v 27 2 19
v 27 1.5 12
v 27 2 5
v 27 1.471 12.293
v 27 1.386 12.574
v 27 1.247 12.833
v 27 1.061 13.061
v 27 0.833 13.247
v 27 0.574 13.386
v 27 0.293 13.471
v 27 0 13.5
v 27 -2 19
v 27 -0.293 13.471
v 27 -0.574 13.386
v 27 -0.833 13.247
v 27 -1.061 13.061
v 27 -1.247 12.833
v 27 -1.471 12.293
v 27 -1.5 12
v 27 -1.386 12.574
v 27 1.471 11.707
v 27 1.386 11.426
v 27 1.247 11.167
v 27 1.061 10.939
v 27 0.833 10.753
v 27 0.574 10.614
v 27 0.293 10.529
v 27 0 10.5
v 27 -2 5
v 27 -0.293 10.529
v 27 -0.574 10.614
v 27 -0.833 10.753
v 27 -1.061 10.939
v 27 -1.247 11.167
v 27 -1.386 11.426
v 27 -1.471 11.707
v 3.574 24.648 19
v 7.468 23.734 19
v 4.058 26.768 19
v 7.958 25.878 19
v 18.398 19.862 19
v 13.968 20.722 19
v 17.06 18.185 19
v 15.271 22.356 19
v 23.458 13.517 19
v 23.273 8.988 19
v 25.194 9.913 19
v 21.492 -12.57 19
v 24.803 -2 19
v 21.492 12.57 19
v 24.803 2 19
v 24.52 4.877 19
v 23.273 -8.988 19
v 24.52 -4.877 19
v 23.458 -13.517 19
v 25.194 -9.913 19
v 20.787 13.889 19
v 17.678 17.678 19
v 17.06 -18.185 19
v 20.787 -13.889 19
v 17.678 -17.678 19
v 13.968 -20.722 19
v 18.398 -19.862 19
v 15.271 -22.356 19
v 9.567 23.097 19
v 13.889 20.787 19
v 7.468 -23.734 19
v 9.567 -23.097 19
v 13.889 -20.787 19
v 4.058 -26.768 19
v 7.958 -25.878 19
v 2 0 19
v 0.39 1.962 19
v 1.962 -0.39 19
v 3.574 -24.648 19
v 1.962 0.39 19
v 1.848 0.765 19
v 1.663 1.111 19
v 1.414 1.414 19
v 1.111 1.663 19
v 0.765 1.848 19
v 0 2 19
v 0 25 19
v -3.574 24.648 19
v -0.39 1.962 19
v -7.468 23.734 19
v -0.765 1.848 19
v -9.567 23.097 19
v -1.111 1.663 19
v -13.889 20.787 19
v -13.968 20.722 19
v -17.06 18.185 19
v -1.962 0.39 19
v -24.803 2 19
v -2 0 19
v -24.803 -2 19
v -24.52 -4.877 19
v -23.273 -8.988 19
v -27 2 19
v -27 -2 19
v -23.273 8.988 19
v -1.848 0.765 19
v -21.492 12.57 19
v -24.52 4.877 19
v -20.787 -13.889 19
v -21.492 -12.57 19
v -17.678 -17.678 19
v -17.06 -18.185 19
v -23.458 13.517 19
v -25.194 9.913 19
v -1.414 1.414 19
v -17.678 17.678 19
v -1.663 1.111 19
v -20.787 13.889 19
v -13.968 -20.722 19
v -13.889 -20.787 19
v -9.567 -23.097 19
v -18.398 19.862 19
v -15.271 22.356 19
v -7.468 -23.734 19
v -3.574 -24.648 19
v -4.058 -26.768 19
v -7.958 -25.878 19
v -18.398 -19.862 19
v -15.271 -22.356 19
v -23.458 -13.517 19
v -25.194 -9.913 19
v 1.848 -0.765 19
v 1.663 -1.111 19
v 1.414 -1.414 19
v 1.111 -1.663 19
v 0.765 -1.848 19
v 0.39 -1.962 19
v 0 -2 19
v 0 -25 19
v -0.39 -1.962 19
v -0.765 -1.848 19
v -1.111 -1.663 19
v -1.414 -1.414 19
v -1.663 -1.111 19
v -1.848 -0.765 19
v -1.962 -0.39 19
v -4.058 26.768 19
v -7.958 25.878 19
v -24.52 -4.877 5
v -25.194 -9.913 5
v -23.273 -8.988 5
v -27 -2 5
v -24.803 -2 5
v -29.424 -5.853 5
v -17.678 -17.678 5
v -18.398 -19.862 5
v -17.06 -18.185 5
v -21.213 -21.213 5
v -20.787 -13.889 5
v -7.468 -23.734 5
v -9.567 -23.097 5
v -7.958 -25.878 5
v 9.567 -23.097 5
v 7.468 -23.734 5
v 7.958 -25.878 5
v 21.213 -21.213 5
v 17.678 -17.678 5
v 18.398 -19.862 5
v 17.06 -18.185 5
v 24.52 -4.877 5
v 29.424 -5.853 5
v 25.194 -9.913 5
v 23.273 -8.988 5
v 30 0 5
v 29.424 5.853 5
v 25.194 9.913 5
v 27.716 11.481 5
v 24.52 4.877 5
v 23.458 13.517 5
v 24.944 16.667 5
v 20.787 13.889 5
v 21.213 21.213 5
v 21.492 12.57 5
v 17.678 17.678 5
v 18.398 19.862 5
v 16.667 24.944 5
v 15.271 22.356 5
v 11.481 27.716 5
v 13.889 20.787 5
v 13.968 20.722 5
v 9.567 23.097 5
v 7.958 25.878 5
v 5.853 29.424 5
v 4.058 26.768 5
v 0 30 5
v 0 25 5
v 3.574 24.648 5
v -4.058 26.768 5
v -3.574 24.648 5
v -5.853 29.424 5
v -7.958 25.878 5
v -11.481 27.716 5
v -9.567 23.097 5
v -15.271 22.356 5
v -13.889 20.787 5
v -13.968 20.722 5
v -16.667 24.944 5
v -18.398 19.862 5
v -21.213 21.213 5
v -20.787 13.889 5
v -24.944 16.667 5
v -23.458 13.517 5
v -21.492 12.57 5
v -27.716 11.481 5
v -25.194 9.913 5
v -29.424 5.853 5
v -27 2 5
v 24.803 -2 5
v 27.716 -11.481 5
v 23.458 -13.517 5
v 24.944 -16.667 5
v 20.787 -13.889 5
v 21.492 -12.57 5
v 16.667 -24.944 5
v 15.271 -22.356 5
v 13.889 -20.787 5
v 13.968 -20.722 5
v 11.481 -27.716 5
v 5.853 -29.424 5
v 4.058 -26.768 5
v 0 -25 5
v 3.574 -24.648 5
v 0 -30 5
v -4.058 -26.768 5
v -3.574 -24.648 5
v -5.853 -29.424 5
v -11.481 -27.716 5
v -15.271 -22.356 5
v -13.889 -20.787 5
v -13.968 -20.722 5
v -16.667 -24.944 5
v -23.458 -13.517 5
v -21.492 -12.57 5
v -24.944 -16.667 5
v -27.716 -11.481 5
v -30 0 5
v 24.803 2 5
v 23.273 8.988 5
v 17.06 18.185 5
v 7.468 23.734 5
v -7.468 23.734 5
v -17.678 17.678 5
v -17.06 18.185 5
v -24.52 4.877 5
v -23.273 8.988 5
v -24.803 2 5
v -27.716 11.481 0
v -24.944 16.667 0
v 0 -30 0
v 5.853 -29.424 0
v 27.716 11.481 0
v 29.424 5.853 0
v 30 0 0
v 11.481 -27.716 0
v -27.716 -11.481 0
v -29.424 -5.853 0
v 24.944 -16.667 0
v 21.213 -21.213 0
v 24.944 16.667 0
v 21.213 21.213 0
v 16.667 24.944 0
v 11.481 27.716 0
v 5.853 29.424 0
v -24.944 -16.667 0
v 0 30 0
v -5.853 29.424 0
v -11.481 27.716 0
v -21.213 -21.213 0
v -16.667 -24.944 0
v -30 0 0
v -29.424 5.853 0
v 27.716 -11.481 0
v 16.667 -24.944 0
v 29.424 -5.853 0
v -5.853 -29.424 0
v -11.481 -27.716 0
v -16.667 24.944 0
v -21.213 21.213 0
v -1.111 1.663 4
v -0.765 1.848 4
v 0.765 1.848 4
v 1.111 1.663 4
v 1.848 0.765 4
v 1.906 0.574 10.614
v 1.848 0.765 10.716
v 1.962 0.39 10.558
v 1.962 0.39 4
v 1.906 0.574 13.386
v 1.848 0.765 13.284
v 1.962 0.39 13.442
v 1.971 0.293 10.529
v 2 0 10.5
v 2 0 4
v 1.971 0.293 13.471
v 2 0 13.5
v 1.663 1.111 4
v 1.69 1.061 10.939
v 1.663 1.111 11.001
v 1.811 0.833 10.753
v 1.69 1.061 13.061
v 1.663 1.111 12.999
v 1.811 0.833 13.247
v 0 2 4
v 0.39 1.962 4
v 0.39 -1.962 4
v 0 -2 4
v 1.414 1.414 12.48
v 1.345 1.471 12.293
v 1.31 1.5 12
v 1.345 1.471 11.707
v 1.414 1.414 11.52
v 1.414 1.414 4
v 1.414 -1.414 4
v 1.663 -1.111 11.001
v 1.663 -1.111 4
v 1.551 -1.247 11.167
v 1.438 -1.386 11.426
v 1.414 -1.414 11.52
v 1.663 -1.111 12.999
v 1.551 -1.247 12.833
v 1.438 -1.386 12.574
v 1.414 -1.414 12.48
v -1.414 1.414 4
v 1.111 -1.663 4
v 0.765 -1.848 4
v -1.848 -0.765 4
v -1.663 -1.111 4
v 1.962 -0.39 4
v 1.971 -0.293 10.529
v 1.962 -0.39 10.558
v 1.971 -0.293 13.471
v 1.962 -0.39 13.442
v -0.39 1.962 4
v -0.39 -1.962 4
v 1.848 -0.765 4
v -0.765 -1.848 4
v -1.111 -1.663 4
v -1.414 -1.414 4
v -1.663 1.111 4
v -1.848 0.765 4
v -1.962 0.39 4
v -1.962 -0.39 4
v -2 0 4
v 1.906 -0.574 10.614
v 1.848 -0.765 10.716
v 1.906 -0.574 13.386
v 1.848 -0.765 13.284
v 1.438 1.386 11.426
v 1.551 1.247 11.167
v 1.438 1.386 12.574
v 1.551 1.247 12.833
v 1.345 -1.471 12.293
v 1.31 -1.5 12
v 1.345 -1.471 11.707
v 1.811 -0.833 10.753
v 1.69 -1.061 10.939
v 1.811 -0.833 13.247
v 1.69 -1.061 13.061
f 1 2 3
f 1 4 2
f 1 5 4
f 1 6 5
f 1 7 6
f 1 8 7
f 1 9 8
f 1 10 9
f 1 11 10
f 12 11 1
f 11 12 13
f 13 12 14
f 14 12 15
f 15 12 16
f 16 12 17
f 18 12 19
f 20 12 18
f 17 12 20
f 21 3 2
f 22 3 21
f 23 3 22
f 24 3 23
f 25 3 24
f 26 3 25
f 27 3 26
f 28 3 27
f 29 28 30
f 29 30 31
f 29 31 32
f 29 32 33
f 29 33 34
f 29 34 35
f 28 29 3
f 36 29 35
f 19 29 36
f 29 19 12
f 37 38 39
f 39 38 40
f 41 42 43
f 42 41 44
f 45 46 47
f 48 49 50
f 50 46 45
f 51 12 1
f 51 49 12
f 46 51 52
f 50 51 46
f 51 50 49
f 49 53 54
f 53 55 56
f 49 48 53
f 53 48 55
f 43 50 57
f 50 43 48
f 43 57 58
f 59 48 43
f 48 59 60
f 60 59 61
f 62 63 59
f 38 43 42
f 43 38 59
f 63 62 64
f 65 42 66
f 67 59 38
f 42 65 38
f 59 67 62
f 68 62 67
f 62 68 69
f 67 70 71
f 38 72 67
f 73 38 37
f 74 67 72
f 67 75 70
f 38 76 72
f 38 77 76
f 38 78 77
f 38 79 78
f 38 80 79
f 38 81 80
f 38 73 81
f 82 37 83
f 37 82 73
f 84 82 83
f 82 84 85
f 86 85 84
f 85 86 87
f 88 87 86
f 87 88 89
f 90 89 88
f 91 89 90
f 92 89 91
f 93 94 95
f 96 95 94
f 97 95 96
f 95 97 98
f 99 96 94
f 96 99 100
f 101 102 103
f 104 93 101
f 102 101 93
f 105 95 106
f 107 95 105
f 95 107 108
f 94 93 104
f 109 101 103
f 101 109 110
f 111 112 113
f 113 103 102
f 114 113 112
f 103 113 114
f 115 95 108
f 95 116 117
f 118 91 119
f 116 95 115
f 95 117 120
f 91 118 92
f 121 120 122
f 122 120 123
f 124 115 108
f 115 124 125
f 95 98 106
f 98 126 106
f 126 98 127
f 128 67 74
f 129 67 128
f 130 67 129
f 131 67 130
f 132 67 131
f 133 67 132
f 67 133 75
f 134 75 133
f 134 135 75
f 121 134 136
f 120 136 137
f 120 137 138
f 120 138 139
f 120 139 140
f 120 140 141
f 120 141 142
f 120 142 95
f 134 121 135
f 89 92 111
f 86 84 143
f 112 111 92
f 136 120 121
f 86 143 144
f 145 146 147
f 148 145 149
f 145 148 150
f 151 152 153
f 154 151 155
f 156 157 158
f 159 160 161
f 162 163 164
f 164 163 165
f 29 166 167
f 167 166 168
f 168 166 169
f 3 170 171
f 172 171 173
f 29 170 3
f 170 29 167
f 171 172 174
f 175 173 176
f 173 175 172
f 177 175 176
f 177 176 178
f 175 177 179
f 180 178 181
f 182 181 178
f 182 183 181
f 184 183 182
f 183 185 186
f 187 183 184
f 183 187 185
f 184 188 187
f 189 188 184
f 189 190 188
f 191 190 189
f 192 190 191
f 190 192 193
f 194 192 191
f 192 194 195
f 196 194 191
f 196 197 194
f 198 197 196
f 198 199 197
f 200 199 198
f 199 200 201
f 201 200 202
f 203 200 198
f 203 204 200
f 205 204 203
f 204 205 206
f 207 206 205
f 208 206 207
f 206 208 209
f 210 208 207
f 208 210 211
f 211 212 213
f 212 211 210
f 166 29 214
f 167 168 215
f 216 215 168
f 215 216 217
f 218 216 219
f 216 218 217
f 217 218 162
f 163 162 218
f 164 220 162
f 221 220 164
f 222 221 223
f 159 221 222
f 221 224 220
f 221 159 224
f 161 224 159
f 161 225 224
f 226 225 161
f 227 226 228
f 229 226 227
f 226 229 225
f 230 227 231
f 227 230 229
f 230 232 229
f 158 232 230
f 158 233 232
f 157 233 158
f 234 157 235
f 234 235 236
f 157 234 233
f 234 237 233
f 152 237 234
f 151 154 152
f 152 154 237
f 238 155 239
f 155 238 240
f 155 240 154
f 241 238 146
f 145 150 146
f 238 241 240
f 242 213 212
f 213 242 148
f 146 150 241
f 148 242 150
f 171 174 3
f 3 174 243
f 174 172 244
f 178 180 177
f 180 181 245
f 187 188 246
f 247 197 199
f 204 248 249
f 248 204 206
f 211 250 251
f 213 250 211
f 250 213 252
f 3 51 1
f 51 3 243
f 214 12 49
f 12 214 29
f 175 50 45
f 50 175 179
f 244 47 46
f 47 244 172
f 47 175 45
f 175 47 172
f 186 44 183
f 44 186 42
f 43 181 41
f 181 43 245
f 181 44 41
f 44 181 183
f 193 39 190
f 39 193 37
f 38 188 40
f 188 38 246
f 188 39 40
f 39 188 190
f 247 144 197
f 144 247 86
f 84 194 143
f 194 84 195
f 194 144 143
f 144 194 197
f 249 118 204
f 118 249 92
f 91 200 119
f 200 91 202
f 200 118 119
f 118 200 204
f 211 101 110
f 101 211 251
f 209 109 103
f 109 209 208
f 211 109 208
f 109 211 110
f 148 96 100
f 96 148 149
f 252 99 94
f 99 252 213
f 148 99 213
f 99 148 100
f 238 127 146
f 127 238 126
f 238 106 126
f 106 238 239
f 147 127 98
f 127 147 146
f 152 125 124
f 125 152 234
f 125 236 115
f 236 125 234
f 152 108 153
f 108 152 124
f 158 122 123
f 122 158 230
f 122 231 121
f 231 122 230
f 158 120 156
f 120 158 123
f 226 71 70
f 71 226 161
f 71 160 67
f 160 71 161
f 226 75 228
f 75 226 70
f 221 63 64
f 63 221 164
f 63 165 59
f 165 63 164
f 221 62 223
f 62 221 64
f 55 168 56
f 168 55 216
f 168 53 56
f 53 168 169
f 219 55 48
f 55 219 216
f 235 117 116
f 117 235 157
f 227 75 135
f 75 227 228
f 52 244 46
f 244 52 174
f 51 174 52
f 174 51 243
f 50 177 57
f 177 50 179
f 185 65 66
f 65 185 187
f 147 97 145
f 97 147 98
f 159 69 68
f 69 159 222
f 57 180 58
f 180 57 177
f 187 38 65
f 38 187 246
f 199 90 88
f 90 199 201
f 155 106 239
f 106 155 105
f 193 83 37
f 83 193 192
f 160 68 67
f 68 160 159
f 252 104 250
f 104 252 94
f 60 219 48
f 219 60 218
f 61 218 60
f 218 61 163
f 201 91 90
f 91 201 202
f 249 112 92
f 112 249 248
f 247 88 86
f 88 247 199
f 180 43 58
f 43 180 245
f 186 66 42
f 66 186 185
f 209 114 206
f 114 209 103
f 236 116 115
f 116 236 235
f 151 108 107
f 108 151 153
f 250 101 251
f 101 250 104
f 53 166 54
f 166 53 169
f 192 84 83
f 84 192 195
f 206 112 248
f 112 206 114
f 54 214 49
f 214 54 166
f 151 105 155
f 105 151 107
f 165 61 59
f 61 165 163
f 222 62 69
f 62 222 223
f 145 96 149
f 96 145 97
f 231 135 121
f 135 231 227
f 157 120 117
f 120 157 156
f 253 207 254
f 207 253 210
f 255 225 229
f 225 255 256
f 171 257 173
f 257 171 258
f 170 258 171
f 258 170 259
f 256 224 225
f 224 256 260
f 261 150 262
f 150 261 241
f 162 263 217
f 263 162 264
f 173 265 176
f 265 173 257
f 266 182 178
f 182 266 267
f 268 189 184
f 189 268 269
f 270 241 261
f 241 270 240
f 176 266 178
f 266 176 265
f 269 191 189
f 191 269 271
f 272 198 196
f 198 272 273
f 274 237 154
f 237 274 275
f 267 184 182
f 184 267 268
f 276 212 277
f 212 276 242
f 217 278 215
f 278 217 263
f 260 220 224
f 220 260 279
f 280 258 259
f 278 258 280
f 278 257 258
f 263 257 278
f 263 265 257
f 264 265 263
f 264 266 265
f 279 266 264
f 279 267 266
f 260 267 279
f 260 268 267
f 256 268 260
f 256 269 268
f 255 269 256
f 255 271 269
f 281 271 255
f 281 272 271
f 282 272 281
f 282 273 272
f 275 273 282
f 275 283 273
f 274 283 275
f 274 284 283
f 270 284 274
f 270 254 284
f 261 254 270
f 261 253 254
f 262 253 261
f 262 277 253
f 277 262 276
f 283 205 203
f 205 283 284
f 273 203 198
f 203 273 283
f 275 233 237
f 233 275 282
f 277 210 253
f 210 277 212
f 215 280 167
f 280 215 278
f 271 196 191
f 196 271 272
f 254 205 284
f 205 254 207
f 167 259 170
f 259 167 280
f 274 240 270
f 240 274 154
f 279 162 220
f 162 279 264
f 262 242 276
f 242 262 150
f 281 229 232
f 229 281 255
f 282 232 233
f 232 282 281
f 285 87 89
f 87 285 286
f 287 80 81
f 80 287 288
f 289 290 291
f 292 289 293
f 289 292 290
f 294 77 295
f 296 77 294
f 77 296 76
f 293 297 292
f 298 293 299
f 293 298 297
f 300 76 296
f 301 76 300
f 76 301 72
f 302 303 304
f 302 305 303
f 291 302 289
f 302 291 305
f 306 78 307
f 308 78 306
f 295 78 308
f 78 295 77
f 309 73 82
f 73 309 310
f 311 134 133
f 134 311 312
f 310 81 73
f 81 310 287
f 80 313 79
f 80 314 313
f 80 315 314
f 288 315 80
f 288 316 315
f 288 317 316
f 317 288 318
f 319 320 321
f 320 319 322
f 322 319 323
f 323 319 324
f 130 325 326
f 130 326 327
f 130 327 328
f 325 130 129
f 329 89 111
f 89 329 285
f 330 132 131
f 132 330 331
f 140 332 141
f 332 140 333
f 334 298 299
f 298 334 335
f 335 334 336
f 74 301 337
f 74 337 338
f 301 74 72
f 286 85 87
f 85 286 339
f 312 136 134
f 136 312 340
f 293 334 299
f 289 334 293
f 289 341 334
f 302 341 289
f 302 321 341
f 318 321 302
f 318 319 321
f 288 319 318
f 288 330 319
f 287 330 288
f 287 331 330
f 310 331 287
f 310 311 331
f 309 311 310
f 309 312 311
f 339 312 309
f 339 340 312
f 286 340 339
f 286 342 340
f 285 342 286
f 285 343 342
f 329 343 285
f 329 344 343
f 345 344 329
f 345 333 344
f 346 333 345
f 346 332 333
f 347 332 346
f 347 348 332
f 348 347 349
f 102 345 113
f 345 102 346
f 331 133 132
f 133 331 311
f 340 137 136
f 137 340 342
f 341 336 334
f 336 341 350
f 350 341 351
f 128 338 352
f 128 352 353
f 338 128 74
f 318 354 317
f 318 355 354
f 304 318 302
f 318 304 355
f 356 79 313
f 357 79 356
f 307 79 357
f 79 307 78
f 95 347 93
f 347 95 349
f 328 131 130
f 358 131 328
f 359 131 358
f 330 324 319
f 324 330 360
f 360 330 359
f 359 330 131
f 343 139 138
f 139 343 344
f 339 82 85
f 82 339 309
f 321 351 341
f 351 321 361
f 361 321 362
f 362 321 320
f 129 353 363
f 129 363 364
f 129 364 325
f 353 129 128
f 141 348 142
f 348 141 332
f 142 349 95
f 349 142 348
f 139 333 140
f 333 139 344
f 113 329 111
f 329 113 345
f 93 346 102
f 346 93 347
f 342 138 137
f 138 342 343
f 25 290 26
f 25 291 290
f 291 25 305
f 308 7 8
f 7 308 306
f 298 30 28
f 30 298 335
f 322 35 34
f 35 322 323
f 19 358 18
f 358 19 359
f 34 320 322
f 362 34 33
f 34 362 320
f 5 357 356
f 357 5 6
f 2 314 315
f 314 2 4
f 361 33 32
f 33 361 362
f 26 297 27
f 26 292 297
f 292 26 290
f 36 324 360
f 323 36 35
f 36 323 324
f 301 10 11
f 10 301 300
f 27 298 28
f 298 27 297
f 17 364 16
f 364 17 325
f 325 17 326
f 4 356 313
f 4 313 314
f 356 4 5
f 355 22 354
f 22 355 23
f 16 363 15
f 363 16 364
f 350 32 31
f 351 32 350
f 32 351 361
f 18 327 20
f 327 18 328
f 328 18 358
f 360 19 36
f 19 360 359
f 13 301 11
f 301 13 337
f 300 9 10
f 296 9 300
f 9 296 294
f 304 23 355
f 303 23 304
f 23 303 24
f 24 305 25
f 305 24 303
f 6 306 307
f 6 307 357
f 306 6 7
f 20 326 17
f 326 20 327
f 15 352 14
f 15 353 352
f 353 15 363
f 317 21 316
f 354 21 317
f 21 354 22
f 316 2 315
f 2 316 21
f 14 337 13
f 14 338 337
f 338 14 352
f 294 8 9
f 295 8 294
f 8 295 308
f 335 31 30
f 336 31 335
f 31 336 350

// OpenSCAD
$fn = 32;

// ----------------------------------------------------------------------
// Control knob: skirt knob with grip ribs
// ----------------------------------------------------------------------

// --- parameters (mm) ---
skirt_d = 60;             // skirt diameter
skirt_t = 5;              // skirt thickness
rib_w = 4;                // grip rib width
rib_out = 3;              // grip rib radial protrusion
n_ribs = 14;              // number of grip ribs
knob_d = 50;              // knob body diameter
knob_h = 14;              // knob body height
bore_d = 4;               // shaft bore diameter
set_d = 3;                // set screw bore diameter
fit_tol = 0.05;           // tolerance for press fits, mm
free_tol = 0.2;           // tolerance for clearance fits, mm

rib_step = 360 / n_ribs;  // rib angular step
total_h = skirt_t + knob_h;  // overall height

difference() {
  union() {
    translate([0, 0, skirt_t]) cylinder(h = knob_h, d = knob_d);
    cylinder(h = skirt_t, d = skirt_d);
    for (i = [0 : n_ribs - 1])
      rotate([0, 0, i * rib_step])
        translate([knob_d / 2 - 1, -rib_w / 2, skirt_t])
          cube([rib_out, rib_w, knob_h]);
  }
  translate([0, 0, skirt_t - 1]) cylinder(h = knob_h + 2, d = bore_d);
  translate([-1, 0, skirt_t + knob_h / 2]) rotate([0, 90, 0])
    cylinder(h = knob_d / 2 + bore_d / 2 + 2, d = set_d);
}
